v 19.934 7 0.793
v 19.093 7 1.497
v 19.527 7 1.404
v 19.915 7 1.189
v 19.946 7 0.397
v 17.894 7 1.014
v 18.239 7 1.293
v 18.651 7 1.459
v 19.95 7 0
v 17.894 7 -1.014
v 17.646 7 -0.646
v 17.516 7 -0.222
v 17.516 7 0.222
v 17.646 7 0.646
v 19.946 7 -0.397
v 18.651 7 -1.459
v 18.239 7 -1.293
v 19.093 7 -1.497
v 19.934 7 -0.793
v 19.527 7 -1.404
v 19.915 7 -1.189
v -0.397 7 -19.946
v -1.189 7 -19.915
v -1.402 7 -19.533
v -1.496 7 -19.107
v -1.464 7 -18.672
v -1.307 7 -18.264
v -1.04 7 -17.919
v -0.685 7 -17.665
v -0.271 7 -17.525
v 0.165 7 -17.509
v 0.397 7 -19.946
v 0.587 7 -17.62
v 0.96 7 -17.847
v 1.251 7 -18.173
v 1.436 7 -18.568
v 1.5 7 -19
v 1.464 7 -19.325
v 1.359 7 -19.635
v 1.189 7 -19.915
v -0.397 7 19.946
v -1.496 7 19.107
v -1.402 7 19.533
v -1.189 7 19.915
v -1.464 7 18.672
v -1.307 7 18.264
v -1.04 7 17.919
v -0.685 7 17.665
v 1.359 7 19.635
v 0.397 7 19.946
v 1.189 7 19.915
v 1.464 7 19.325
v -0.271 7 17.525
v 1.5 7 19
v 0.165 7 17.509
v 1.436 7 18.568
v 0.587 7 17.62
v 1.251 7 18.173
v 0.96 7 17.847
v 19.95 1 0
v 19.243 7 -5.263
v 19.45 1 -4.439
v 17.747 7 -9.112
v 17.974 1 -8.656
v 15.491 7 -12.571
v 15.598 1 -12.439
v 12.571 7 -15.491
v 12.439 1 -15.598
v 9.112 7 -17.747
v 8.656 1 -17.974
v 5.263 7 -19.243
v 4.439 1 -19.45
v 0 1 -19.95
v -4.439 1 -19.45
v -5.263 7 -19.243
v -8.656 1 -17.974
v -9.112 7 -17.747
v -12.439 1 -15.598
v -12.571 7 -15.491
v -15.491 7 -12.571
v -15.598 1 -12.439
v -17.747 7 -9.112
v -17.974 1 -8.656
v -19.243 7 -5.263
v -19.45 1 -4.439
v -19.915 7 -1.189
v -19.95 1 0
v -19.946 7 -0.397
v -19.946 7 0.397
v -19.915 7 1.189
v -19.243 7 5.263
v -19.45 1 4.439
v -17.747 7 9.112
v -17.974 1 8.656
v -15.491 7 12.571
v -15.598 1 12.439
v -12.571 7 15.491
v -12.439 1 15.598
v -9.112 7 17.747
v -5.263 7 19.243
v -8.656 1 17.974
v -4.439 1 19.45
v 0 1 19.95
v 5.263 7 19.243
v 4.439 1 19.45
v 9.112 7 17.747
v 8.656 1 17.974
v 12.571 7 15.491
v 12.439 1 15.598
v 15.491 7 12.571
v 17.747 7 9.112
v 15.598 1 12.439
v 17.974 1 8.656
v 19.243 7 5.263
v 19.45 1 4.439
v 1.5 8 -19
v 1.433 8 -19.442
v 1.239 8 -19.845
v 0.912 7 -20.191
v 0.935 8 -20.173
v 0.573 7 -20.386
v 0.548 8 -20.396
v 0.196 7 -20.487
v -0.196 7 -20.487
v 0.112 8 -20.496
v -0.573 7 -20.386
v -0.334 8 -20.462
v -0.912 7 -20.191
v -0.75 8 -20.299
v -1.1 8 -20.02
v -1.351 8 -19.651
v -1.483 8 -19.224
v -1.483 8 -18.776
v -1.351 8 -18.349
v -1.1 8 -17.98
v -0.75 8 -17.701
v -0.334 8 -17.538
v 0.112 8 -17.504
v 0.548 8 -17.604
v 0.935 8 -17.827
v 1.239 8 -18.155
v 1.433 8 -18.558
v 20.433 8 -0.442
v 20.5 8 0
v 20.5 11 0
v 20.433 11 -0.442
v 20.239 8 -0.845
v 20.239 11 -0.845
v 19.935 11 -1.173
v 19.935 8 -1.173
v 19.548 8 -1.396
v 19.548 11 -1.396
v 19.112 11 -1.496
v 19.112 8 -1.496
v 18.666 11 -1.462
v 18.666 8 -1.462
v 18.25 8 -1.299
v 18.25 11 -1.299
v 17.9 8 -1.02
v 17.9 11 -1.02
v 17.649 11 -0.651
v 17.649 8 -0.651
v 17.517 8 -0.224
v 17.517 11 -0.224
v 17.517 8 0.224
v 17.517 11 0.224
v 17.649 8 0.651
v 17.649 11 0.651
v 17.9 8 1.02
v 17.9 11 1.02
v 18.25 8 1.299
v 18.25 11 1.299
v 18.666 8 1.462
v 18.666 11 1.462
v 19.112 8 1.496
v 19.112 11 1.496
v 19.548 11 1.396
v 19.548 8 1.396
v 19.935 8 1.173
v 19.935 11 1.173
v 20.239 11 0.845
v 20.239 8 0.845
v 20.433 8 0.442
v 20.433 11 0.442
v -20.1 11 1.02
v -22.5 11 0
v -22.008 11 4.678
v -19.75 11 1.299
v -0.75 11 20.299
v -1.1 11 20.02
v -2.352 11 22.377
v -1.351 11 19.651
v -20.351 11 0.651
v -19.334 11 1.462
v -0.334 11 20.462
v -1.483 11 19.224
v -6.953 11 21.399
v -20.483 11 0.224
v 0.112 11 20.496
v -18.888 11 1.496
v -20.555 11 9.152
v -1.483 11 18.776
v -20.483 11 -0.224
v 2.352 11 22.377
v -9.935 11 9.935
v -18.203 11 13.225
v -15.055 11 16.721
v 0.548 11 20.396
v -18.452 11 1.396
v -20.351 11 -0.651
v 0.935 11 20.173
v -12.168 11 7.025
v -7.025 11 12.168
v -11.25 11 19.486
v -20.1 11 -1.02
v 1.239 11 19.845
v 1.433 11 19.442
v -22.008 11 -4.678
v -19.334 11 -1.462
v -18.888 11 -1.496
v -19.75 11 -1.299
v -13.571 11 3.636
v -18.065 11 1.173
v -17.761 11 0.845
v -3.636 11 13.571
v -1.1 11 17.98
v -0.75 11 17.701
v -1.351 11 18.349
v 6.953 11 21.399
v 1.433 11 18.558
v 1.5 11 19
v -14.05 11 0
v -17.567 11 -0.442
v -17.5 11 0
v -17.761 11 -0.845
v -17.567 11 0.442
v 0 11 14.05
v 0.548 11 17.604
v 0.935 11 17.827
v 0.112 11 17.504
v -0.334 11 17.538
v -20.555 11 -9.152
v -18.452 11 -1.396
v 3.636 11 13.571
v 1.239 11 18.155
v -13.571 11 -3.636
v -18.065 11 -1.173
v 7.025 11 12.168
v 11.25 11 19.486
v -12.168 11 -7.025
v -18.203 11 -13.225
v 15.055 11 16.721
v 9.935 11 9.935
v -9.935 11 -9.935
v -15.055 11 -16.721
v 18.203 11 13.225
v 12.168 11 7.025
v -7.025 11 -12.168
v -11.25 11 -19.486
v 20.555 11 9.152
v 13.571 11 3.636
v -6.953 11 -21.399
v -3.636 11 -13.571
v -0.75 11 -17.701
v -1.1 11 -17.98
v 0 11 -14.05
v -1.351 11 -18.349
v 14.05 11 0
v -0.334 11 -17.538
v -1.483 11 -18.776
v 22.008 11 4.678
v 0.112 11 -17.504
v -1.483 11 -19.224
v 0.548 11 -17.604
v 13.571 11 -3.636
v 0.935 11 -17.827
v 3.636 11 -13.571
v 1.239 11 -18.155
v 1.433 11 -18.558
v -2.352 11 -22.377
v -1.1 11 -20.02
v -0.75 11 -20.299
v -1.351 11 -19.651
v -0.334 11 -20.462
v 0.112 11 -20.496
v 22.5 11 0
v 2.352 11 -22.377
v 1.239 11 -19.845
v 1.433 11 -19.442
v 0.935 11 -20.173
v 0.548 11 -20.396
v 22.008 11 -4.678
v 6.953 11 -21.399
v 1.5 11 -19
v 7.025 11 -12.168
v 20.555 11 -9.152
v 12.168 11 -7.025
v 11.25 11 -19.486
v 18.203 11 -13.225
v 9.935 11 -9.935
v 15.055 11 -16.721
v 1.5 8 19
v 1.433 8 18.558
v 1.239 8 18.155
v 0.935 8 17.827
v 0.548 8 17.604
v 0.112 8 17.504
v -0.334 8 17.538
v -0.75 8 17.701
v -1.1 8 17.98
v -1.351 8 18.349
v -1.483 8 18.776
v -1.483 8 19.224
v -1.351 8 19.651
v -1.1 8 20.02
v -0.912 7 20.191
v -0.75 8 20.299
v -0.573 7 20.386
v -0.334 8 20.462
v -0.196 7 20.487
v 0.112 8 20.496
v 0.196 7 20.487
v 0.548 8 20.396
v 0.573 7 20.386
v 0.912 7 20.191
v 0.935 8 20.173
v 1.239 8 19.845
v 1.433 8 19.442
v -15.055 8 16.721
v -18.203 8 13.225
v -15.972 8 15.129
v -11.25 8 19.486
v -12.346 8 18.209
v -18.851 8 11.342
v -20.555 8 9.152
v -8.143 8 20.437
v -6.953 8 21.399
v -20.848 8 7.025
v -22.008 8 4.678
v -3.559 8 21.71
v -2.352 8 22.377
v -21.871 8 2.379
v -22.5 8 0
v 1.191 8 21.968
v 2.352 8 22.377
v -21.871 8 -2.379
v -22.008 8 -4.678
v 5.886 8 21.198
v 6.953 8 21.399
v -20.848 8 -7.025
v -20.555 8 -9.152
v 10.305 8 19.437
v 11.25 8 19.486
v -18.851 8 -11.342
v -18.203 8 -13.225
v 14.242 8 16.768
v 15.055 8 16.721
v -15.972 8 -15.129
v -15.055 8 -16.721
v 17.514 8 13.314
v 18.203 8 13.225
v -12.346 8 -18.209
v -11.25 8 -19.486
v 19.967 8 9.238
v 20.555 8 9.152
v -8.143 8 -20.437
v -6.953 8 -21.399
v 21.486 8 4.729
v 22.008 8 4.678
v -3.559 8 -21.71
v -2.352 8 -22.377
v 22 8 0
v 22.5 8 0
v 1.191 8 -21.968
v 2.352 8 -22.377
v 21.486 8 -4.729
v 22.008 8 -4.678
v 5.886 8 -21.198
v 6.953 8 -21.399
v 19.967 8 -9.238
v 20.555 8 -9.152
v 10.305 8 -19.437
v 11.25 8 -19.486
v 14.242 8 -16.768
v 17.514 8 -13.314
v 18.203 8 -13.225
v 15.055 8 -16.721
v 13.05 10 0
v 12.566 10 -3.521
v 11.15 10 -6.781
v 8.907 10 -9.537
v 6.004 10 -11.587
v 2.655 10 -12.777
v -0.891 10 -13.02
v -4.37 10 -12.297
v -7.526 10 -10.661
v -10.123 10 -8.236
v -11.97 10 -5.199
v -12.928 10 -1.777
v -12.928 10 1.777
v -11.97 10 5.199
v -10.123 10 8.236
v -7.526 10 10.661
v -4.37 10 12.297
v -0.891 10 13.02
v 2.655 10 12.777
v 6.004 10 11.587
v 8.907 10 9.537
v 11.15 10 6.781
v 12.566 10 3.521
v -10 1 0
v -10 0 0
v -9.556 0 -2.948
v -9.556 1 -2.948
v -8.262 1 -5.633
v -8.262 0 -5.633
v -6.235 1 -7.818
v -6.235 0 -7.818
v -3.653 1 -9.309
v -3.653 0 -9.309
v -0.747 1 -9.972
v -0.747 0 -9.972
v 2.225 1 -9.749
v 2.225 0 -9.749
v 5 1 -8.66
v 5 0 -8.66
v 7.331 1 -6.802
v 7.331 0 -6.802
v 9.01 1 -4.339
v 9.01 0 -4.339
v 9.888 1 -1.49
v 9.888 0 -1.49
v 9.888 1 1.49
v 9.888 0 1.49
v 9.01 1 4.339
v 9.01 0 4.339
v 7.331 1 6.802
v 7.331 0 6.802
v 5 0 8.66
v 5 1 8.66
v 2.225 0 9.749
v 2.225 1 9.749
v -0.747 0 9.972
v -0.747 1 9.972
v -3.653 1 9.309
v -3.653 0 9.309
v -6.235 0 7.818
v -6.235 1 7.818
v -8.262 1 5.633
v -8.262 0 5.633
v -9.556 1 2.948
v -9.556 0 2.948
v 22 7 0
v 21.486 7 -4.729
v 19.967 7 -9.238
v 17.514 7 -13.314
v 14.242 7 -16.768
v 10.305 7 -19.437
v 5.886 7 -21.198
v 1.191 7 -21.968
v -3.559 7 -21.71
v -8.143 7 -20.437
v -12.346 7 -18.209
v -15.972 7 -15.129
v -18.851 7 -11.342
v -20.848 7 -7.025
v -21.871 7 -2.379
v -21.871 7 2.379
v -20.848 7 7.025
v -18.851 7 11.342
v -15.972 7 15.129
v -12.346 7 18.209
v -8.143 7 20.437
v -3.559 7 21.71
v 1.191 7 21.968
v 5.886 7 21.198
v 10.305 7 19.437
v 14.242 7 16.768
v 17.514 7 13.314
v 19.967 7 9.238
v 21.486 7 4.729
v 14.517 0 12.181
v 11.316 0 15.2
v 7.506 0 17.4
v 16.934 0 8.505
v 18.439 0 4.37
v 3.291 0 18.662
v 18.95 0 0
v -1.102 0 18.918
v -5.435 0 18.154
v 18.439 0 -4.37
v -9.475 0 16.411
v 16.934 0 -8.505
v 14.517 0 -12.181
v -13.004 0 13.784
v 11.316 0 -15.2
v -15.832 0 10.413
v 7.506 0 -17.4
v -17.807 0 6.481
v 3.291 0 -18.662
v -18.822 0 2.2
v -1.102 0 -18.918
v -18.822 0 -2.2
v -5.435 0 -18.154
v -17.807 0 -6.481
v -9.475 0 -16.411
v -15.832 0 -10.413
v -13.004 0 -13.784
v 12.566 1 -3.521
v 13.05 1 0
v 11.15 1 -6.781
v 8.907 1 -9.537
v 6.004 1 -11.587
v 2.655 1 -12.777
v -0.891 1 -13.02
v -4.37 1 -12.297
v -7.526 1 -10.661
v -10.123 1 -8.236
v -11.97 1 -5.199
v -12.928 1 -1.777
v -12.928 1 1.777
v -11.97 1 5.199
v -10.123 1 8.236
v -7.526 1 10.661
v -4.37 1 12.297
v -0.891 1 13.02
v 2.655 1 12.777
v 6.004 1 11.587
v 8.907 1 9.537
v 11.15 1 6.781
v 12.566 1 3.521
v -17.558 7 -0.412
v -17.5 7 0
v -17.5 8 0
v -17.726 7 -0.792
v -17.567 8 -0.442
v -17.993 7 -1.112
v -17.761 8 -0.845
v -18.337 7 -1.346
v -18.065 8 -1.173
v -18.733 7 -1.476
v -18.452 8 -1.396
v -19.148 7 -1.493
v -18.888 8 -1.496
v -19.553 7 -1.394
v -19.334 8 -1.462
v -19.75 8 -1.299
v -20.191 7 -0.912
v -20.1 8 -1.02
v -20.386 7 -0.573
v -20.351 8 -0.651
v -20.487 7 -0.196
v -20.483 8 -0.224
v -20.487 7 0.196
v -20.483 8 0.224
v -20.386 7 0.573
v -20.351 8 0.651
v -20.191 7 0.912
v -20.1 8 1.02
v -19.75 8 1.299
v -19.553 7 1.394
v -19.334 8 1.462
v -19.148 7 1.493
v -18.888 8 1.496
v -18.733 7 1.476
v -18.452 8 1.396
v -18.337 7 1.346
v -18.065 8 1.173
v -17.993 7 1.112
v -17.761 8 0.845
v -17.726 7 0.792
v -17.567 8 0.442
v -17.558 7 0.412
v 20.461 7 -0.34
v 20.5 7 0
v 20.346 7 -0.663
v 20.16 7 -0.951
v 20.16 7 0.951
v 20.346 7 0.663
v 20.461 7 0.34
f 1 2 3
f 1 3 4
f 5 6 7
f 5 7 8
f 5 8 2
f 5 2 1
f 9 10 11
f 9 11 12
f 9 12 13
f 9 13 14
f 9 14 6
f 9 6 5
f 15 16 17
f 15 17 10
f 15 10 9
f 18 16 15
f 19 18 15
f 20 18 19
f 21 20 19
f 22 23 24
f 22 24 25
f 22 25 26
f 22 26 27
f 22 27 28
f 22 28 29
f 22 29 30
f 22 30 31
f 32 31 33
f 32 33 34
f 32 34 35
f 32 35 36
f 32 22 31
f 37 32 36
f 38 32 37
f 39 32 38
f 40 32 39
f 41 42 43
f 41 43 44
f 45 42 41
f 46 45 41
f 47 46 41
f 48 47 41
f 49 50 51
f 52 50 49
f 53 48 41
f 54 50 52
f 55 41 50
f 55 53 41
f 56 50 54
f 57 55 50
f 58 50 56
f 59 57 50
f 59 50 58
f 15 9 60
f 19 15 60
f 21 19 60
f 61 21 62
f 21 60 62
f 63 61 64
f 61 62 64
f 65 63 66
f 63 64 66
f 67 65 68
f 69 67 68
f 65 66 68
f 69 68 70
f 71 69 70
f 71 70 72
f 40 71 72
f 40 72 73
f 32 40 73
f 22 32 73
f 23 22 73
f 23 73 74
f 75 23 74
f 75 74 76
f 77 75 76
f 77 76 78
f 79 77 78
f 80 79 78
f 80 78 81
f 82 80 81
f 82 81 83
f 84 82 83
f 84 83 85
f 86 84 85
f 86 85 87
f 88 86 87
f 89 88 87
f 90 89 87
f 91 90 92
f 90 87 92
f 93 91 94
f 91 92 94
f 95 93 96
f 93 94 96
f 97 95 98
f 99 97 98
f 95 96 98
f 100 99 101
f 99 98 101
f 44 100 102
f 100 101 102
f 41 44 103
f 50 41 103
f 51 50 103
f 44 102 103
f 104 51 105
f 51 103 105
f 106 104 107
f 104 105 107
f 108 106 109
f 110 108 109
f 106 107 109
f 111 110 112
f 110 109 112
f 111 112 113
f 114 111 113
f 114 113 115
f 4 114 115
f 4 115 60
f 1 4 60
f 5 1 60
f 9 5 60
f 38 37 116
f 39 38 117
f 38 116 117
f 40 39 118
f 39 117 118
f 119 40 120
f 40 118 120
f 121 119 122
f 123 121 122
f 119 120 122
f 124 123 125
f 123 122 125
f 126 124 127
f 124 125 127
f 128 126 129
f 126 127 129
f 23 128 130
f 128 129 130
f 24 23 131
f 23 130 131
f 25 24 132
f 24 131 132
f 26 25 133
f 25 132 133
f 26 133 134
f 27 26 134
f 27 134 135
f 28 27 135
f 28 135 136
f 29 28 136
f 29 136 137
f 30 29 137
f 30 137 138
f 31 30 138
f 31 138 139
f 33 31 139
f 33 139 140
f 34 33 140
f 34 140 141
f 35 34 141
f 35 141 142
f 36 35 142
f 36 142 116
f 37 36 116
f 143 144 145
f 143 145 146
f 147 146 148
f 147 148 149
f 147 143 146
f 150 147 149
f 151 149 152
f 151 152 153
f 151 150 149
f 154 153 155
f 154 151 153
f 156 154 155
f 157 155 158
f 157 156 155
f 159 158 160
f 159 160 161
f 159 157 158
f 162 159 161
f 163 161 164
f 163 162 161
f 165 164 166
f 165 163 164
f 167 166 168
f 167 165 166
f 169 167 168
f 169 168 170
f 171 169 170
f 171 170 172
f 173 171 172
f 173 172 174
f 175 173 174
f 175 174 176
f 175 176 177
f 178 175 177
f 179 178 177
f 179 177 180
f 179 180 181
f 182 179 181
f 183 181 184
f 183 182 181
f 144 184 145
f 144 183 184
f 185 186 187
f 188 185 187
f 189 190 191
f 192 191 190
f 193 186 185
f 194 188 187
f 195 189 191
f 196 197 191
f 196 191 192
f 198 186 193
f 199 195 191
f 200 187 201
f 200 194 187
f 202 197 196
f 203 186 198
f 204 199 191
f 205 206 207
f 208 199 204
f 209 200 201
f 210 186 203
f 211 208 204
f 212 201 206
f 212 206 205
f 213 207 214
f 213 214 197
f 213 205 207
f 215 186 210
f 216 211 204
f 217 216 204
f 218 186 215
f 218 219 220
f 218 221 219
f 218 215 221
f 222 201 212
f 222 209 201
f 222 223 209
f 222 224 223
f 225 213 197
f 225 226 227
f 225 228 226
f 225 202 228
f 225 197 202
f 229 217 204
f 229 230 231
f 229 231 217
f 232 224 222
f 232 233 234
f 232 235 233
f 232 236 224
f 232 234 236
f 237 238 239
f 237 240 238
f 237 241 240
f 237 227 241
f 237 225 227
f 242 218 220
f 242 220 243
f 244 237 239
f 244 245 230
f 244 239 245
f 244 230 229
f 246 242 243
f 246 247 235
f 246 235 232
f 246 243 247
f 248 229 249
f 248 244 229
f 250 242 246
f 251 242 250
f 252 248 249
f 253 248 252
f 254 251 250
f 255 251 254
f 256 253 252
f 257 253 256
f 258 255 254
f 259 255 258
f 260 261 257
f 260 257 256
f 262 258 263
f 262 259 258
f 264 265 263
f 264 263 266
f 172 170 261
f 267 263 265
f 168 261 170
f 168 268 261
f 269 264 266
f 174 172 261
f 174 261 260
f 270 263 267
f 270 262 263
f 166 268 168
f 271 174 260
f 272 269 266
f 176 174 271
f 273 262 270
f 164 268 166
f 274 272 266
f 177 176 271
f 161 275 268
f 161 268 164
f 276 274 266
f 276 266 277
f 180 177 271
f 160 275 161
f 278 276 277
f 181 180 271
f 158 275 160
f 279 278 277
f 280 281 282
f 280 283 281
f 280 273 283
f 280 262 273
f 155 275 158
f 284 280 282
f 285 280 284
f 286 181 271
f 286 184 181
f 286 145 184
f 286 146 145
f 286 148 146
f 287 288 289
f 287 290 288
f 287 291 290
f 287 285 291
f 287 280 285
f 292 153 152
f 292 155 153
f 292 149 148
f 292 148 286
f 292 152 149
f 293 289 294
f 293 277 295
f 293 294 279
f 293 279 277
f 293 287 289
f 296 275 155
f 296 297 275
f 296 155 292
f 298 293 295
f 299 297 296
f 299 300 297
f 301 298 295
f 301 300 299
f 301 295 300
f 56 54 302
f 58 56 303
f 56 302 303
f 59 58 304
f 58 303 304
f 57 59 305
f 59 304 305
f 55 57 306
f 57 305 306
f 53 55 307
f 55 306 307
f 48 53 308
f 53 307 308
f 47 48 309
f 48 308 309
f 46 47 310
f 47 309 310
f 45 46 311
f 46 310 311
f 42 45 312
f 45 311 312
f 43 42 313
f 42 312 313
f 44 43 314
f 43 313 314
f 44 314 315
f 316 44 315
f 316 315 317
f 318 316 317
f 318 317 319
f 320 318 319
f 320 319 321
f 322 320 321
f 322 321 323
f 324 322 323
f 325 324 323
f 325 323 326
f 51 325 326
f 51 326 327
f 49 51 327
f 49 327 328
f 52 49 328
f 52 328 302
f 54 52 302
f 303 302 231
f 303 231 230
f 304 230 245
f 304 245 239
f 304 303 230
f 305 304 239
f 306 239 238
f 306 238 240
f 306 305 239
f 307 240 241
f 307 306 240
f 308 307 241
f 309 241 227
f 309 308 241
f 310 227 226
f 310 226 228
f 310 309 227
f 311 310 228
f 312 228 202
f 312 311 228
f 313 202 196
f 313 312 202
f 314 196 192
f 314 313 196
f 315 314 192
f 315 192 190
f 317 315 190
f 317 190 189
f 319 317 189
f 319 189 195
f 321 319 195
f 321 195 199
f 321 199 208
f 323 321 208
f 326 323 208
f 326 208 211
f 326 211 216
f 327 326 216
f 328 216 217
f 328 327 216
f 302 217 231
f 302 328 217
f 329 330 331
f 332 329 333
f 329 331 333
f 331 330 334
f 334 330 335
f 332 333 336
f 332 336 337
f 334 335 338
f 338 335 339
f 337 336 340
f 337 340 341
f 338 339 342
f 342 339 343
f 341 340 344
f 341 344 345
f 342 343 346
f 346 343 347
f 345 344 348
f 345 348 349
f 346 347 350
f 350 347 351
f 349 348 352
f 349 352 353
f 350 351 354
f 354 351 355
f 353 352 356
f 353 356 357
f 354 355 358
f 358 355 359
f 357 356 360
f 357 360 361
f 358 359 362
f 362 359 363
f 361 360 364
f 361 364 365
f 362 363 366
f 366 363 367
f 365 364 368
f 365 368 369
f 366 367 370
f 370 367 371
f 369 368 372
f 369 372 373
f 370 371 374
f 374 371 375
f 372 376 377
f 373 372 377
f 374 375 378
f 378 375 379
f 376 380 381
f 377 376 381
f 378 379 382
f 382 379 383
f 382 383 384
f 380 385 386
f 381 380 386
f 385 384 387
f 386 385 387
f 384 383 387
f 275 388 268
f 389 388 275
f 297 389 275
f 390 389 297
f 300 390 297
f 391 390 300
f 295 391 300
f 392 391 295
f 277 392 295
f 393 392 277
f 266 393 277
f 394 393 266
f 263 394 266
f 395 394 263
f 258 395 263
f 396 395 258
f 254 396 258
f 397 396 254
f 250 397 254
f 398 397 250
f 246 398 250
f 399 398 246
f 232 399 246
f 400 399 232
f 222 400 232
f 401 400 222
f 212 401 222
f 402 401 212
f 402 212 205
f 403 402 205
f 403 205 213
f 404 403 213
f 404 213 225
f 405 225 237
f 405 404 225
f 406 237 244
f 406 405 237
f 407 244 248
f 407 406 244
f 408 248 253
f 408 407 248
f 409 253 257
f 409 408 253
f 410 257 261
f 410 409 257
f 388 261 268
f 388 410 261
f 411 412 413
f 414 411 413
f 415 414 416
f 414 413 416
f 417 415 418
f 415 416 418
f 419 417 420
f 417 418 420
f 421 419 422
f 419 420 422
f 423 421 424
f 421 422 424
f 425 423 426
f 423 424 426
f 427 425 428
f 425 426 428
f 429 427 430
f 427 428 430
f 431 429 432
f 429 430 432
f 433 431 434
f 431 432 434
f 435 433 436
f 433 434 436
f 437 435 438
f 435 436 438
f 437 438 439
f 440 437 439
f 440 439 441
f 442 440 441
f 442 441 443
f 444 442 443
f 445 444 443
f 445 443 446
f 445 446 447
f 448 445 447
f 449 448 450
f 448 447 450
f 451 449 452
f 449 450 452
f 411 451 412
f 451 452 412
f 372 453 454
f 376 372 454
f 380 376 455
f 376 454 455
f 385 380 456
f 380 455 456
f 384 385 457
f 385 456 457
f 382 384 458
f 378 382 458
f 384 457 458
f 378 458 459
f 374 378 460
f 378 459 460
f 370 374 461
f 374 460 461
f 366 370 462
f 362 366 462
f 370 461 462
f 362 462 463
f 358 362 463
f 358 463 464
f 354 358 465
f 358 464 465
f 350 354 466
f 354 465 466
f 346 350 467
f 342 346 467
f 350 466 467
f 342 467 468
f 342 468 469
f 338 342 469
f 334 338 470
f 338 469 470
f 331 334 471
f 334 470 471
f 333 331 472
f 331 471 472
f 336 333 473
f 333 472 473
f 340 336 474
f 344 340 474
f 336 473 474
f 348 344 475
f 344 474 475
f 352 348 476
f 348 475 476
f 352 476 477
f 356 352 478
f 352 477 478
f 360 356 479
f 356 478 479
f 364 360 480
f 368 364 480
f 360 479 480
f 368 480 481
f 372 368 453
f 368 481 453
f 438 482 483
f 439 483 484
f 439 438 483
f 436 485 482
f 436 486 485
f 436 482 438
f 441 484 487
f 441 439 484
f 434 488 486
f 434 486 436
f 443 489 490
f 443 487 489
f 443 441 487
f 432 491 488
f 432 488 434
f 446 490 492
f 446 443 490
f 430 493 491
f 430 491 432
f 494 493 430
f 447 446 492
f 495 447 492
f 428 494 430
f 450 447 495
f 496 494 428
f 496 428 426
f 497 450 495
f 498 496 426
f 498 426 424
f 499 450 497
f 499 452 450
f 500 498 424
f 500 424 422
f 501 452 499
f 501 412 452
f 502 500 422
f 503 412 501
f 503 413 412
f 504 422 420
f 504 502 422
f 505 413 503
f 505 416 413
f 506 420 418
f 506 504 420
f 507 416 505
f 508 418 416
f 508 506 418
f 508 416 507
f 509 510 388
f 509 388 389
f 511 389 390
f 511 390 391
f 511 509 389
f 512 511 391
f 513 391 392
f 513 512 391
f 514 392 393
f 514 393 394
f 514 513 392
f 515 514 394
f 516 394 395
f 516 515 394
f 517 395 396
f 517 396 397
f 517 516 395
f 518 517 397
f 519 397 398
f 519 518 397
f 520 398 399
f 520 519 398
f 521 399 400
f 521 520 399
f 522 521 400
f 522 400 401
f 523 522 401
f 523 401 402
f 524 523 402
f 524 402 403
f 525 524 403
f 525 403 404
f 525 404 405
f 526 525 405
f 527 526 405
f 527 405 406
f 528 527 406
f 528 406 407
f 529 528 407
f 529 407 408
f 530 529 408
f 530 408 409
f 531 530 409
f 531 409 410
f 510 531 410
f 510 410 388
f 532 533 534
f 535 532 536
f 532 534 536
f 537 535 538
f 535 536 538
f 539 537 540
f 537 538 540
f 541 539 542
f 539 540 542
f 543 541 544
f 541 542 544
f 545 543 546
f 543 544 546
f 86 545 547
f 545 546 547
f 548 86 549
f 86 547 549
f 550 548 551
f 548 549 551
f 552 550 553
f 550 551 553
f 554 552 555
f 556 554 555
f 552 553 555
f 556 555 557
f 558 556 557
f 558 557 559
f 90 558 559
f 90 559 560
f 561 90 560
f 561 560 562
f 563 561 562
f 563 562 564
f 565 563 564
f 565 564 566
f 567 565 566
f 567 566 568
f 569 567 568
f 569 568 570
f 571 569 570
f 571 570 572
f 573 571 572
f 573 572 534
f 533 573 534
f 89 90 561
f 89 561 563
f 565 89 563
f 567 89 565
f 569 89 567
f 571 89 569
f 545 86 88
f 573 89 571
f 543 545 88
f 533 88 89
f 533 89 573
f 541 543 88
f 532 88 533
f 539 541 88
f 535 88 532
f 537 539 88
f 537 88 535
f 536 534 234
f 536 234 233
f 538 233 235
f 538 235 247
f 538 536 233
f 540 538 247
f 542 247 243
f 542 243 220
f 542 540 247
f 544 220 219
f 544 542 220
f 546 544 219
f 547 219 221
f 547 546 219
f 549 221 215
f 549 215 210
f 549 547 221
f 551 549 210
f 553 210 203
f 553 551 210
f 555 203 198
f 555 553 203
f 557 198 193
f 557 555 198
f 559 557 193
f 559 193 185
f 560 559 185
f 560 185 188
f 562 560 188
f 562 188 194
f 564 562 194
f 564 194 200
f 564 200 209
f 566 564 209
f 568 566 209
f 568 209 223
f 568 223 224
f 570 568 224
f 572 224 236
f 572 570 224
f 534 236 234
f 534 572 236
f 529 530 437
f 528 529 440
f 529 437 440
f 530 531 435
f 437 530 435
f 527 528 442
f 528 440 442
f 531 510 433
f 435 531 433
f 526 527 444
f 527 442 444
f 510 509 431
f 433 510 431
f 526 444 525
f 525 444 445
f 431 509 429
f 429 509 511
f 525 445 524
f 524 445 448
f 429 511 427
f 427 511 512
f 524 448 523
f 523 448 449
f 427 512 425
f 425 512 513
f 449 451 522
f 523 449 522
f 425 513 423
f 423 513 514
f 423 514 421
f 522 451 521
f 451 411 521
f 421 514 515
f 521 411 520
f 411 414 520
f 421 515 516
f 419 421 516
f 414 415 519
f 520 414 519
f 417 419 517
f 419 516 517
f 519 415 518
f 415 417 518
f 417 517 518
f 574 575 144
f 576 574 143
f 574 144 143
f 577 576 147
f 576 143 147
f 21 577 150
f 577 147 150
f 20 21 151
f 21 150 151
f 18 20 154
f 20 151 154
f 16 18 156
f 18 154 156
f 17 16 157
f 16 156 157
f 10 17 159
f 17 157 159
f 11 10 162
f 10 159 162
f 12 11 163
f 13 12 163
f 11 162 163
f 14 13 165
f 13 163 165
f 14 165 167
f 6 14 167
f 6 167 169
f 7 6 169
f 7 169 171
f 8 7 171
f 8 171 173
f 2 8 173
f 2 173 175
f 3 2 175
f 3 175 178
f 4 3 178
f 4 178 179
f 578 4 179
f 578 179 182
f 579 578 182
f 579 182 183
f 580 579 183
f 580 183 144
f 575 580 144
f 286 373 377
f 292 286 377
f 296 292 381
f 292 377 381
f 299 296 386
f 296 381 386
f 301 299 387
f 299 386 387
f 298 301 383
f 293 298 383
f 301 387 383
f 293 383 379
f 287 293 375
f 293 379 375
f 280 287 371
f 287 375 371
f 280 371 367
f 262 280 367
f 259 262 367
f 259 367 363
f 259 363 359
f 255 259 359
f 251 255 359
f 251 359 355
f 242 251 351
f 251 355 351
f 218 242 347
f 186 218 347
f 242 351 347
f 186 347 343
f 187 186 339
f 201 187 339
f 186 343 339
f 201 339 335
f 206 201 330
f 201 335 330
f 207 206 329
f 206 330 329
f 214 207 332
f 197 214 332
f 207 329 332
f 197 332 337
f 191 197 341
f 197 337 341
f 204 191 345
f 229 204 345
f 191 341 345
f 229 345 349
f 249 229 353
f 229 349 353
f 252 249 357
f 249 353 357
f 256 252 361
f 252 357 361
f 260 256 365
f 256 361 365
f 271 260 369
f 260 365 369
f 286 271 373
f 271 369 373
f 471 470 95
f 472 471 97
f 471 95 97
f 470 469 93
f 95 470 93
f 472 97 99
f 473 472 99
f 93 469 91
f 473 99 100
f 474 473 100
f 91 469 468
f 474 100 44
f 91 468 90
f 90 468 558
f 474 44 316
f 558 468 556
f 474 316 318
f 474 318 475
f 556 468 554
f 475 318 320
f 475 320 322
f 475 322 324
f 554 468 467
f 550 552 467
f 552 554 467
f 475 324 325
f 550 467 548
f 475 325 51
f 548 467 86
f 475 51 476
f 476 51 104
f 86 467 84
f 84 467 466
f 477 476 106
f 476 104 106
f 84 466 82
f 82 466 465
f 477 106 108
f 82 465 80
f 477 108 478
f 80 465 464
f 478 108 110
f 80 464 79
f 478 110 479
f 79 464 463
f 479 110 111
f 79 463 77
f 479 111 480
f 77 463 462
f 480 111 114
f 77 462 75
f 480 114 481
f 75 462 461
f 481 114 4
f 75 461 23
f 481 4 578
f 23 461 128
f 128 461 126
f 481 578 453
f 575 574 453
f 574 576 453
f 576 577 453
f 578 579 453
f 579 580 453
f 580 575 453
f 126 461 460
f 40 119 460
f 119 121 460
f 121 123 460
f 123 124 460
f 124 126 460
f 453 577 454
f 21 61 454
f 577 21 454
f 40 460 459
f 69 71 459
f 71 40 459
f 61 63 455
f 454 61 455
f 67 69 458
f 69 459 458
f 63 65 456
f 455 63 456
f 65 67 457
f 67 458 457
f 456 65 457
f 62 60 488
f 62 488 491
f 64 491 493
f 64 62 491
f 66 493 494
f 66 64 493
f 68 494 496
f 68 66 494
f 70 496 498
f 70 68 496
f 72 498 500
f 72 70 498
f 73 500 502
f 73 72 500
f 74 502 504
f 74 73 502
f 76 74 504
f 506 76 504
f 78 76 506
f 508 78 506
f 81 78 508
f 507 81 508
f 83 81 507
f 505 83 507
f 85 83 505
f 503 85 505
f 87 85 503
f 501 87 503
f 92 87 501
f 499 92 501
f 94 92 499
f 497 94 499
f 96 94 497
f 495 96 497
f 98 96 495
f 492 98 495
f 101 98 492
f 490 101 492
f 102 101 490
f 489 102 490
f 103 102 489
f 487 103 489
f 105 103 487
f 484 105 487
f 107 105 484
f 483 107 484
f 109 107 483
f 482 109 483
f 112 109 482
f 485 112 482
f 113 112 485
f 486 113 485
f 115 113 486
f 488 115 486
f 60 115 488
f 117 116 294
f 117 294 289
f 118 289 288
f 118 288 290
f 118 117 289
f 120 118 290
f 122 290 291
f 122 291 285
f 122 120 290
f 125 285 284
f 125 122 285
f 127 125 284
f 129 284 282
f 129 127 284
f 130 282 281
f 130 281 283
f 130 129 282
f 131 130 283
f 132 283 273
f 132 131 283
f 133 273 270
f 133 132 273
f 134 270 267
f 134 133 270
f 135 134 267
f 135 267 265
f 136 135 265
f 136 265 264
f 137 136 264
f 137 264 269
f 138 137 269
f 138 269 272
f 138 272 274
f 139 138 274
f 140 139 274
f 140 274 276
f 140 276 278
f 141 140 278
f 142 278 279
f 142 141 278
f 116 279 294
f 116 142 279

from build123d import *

# Parameters (mm, degrees)
SKETCH1_R           = 19.95
SKETCH1_R_2         = 13.05
BOSS_EXTRUDE1_DEPTH = 7
SKETCH2_R           = 13.05
SKETCH2_R_2         = 10
BOSS_EXTRUDE2_DEPTH = 1
SKETCH3_R           = 22
SKETCH3_R_2         = 13.05
BOSS_EXTRUDE3_DEPTH = 1
SKETCH4_R           = 22.5
SKETCH4_R_2         = 1.5
SKETCH4_R_3         = 13.05
BOSS_EXTRUDE7_DEPTH = 3
CHAMFER1_SIZE       = 1
SKETCH6_R           = 1.5
CUT_EXTRUDE1_DEPTH  = 1


with BuildPart() as part:
    # Sketch1 → Boss-Extrude1 (new body)
    with BuildSketch(Plane(origin=(0, 0, 0), x_dir=(1, 0, 0), z_dir=(0, 1, 0))):
        Circle(SKETCH1_R)
        Circle(SKETCH1_R_2, mode=Mode.SUBTRACT)
    extrude(amount=BOSS_EXTRUDE1_DEPTH)

    # Sketch2 → Boss-Extrude2 (add)
    with BuildSketch(Plane(origin=(0, 0, 0), x_dir=(-1, 0, 0), z_dir=(0, -1, 0))):
        Circle(SKETCH2_R)
        Circle(SKETCH2_R_2, mode=Mode.SUBTRACT)
    extrude(amount=-BOSS_EXTRUDE2_DEPTH)

    # Sketch3 → Boss-Extrude3 (add)
    with BuildSketch(Plane(origin=(0, 7, 0), x_dir=(1, 0, 0), z_dir=(0, 1, 0))):
        Circle(SKETCH3_R)
        Circle(SKETCH3_R_2, mode=Mode.SUBTRACT)
    extrude(amount=BOSS_EXTRUDE3_DEPTH)

    # Sketch4 → Boss-Extrude7 (add)
    with BuildSketch(Plane(origin=(0, 8, 0), x_dir=(1, 0, 0), z_dir=(0, 1, 0))):
        Circle(SKETCH4_R)
        with Locations((0, 19)):
            Circle(SKETCH4_R_2, mode=Mode.SUBTRACT)
        with Locations((19, 0)):
            Circle(SKETCH4_R_2, mode=Mode.SUBTRACT)
        with Locations((0, -19)):
            Circle(SKETCH4_R_2, mode=Mode.SUBTRACT)
        with Locations((-19, 0)):
            Circle(SKETCH4_R_2, mode=Mode.SUBTRACT)
        Circle(SKETCH4_R_3, mode=Mode.SUBTRACT)
    extrude(amount=BOSS_EXTRUDE7_DEPTH)

    # Chamfer1
    chamfer1_edges = [part.edges().sort_by_distance(p)[0] for p in [
        (-19.95, 0, 0),
        (-13.05, 11, 0),
    ]]
    chamfer(chamfer1_edges, length=CHAMFER1_SIZE)

    # Sketch6 → Cut-Extrude1 (cut)
    with BuildSketch(Plane(origin=(0, 8, 0), x_dir=(1, 0, 0), z_dir=(0, 1, 0))):
        with Locations((-19, 0)):
            Circle(SKETCH6_R)
        with Locations((0, -19)):
            Circle(SKETCH6_R)
        with Locations((19, 0)):
            Circle(SKETCH6_R)
        with Locations((0, 19)):
            Circle(SKETCH6_R)
    extrude(amount=-CUT_EXTRUDE1_DEPTH, mode=Mode.SUBTRACT)


solid = part.part
